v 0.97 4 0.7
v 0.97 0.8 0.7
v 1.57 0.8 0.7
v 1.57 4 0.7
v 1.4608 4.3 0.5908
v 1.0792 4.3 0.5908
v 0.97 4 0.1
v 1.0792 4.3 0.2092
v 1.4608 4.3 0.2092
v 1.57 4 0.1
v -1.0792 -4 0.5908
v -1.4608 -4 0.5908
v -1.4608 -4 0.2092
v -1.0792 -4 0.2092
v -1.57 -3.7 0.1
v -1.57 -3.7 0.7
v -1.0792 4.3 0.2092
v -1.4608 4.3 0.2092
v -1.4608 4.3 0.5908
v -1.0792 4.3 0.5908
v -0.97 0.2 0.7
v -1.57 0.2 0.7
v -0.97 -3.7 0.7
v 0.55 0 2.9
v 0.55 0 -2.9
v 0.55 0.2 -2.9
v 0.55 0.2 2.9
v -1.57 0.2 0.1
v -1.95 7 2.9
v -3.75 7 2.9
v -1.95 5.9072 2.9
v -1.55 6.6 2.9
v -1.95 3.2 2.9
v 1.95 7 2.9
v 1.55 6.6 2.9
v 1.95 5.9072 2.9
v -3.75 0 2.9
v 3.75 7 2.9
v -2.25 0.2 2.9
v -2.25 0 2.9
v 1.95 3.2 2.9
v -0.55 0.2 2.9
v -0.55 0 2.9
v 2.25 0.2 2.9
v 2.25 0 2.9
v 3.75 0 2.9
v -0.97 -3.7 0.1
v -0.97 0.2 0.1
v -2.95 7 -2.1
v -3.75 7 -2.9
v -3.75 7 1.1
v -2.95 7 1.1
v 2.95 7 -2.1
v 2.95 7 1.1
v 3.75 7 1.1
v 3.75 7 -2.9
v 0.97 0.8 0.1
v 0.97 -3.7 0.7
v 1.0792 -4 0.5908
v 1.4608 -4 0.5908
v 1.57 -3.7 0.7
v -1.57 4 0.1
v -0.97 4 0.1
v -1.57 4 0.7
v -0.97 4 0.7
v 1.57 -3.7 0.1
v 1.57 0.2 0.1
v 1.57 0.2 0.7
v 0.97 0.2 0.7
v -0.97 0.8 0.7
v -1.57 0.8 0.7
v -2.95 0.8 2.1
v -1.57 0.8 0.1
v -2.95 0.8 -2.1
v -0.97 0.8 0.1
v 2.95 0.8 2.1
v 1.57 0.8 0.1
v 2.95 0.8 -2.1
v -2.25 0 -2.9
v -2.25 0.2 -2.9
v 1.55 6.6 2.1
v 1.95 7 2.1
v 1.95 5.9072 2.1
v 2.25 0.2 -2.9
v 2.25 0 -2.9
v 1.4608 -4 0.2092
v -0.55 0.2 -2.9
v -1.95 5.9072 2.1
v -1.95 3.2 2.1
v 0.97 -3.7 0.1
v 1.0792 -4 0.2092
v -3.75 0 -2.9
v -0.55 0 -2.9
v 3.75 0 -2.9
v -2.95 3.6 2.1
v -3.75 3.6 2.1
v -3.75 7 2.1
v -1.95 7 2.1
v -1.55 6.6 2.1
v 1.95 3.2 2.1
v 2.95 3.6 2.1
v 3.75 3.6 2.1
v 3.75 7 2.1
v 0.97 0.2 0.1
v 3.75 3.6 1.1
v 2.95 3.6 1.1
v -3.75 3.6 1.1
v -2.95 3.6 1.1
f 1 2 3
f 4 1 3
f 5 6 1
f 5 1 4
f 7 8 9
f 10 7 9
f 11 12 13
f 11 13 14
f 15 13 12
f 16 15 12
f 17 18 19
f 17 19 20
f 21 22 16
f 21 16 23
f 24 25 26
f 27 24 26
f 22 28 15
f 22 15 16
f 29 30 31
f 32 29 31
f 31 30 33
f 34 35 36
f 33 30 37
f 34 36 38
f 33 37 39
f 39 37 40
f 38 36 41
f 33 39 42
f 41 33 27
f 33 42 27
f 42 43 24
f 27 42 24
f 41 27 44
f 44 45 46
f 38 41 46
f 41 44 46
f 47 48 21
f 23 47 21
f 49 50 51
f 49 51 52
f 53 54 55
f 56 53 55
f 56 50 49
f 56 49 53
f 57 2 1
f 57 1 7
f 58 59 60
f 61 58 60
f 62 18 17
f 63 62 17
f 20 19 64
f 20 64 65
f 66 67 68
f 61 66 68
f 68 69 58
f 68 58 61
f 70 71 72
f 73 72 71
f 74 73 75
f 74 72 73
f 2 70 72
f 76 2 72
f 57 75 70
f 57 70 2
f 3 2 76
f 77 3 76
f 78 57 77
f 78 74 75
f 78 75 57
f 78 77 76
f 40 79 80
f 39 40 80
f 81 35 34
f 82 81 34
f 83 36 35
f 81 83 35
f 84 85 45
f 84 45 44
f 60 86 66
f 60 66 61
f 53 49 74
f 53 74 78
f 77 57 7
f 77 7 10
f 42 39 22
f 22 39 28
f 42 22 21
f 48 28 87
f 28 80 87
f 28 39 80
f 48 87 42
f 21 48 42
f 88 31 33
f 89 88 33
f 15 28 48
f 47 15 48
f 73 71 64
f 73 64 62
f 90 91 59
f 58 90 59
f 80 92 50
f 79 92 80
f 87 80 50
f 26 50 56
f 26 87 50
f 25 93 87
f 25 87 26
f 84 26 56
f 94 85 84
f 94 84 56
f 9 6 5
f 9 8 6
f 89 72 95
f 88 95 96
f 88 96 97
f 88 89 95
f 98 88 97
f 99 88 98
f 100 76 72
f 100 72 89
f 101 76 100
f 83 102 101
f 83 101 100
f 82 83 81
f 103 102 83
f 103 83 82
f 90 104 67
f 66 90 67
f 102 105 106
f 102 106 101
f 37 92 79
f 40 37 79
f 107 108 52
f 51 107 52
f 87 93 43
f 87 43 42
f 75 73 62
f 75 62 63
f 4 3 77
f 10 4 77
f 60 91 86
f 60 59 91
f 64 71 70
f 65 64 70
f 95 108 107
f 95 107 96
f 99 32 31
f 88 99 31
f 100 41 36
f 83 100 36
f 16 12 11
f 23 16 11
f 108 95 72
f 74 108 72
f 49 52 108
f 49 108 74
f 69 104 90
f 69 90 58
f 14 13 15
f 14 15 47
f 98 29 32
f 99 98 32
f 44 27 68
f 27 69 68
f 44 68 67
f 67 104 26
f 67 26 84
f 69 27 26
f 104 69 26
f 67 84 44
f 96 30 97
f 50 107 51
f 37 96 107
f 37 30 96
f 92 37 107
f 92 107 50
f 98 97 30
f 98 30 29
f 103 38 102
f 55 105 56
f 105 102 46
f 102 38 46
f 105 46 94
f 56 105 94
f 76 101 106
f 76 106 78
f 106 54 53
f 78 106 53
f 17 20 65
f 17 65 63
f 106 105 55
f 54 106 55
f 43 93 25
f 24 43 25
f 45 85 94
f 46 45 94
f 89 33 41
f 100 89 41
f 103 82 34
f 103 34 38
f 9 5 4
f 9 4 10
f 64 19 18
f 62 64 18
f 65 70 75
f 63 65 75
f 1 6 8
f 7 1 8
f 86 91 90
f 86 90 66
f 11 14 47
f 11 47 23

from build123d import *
from OCP.BRepFilletAPI import BRepFilletAPI_MakeChamfer

# Parameters (mm, degrees)
SKETCH_1_W               = 7.5
SKETCH_1_H               = 5.8
EXTRUDE_1_DEPTH          = 7
CUT_EXTRUDE_1_DEPTH      = 9.454140997
CUT_EXTRUDE_1_DEPTH_BACK = 9.454140997
SKETCH_2_W               = 1.7
SKETCH_2_H               = 0.2
SKETCH_3_W               = 5.9
SKETCH_3_H               = 4.2
CUT_EXTRUDE_2_DEPTH      = 6.2
CUT_EXTRUDE_3_DEPTH      = 1
CUT_EXTRUDE_4_DEPTH      = 9.454140997
CUT_EXTRUDE_4_DEPTH_BACK = 9.454140997
SKETCH_5_W               = 1
SKETCH_5_H               = 3.4
SKETCH_6_W               = 0.6
SKETCH_6_H               = 0.6
EXTRUDE_3_DEPTH          = 4.2
SKETCH_7_W               = 0.6
SKETCH_7_H               = 0.6
EXTRUDE_4_DEPTH          = 3.5
CHAMFER_1_SIZE           = 0.3
CHAMFER_1_SIZE2          = 0.10919107


with BuildPart() as part:
    # 草图1 → 凸台-拉伸1 (new body)
    with BuildSketch(Plane(origin=(0, 0, 0), x_dir=(1, 0, 0), z_dir=(0, 1, 0))):
        Rectangle(SKETCH_1_W, SKETCH_1_H)
    extrude(amount=EXTRUDE_1_DEPTH)

    # 草图2 → 切除-拉伸1 (cut, two sides: drawn at the far end of the back side and taken through both)
    with BuildSketch(Plane.XY.offset(-CUT_EXTRUDE_1_DEPTH_BACK)):
        with Locations((-1.4, 0.1)):
            Rectangle(SKETCH_2_W, SKETCH_2_H)
        with Locations((1.4, 0.1)):
            Rectangle(SKETCH_2_W, SKETCH_2_H)
    extrude(amount=CUT_EXTRUDE_1_DEPTH + CUT_EXTRUDE_1_DEPTH_BACK, mode=Mode.SUBTRACT)

    # 草图3 → 切除-拉伸2 (cut)
    with BuildSketch(Plane(origin=(0, 7, 0), x_dir=(1, 0, 0), z_dir=(0, 1, 0))):
        Rectangle(SKETCH_3_W, SKETCH_3_H)
    extrude(amount=-CUT_EXTRUDE_2_DEPTH, mode=Mode.SUBTRACT)

    # 草图4 → 切除-拉伸3 (cut)
    with BuildSketch(Plane.XY.offset(2.9)):
        Polygon((-1.95, 7), (-1.55, 6.6), (-1.95, 5.907179677), (-1.95, 3.2), (1.95, 3.2), (1.95, 5.907179677), (1.55, 6.6), (1.95, 7), align=None)
    extrude(amount=-CUT_EXTRUDE_3_DEPTH, mode=Mode.SUBTRACT)

    # 草图5 → 切除-拉伸4 (cut, two sides: drawn at the far end of the back side and taken through both)
    with BuildSketch(Plane.ZY.offset(-CUT_EXTRUDE_4_DEPTH_BACK)):
        with Locations((1.6, 5.3)):
            Rectangle(SKETCH_5_W, SKETCH_5_H)
    extrude(amount=CUT_EXTRUDE_4_DEPTH + CUT_EXTRUDE_4_DEPTH_BACK, mode=Mode.SUBTRACT)

    # 草图6 → 凸台-拉伸3 (add)
    with BuildSketch(Plane.XZ.offset(-0.2)):
        with Locations((-1.27, 0.4)):
            Rectangle(SKETCH_6_W, SKETCH_6_H)
        with Locations((1.27, 0.4)):
            Rectangle(SKETCH_6_W, SKETCH_6_H)
    extrude(amount=EXTRUDE_3_DEPTH)

    # 草图7 → 凸台-拉伸4 (add)
    with BuildSketch(Plane(origin=(0, 0.8, 0), x_dir=(1, 0, 0), z_dir=(0, 1, 0))):
        with Locations((1.27, -0.4)):
            Rectangle(SKETCH_7_W, SKETCH_7_H)
        with Locations((-1.27, -0.4)):
            Rectangle(SKETCH_7_W, SKETCH_7_H)
    extrude(amount=EXTRUDE_4_DEPTH)

    # 倒角1: one chamfer whose edges measure the first distance from different faces: ONE call of the kernel's chamfer builder (chamfer() names one face for all edges)
    chamfer_1_edges_1 = [part.edges().sort_by_distance(p)[0] for p in [
        (-1.27, -4, 0.7),
    ]]
    chamfer_1_side_1 = [part.faces().sort_by_distance(p)[0] for p in [
        (-1.27, -1.9, 0.7),
    ]]
    chamfer_1_edges_2 = [part.edges().sort_by_distance(p)[0] for p in [
        (-1.57, -4, 0.4),
    ]]
    chamfer_1_side_2 = [part.faces().sort_by_distance(p)[0] for p in [
        (-1.57, -1.9, 0.4),
    ]]
    chamfer_1_edges_3 = [part.edges().sort_by_distance(p)[0] for p in [
        (-1.27, -4, 0.1),
    ]]
    chamfer_1_side_3 = [part.faces().sort_by_distance(p)[0] for p in [
        (-1.27, -1.9, 0.1),
    ]]
    chamfer_1_edges_4 = [part.edges().sort_by_distance(p)[0] for p in [
        (-0.97, -4, 0.4),
    ]]
    chamfer_1_side_4 = [part.faces().sort_by_distance(p)[0] for p in [
        (-0.97, -1.9, 0.4),
    ]]
    chamfer_1_edges_5 = [part.edges().sort_by_distance(p)[0] for p in [
        (1.27, -4, 0.1),
    ]]
    chamfer_1_side_5 = [part.faces().sort_by_distance(p)[0] for p in [
        (1.27, -1.9, 0.1),
    ]]
    chamfer_1_edges_6 = [part.edges().sort_by_distance(p)[0] for p in [
        (1.57, -4, 0.4),
    ]]
    chamfer_1_side_6 = [part.faces().sort_by_distance(p)[0] for p in [
        (1.57, -1.9, 0.4),
    ]]
    chamfer_1_edges_7 = [part.edges().sort_by_distance(p)[0] for p in [
        (1.27, -4, 0.7),
    ]]
    chamfer_1_side_7 = [part.faces().sort_by_distance(p)[0] for p in [
        (1.27, -1.9, 0.7),
    ]]
    chamfer_1_edges_8 = [part.edges().sort_by_distance(p)[0] for p in [
        (0.97, -4, 0.4),
    ]]
    chamfer_1_side_8 = [part.faces().sort_by_distance(p)[0] for p in [
        (0.97, -1.9, 0.4),
    ]]
    chamfer_1_edges_9 = [part.edges().sort_by_distance(p)[0] for p in [
        (1.27, 4.3, 0.7),
    ]]
    chamfer_1_side_9 = [part.faces().sort_by_distance(p)[0] for p in [
        (1.27, 2.55, 0.7),
    ]]
    chamfer_1_edges_10 = [part.edges().sort_by_distance(p)[0] for p in [
        (1.57, 4.3, 0.4),
    ]]
    chamfer_1_side_10 = [part.faces().sort_by_distance(p)[0] for p in [
        (1.57, 2.55, 0.4),
    ]]
    chamfer_1_edges_11 = [part.edges().sort_by_distance(p)[0] for p in [
        (1.27, 4.3, 0.1),
    ]]
    chamfer_1_side_11 = [part.faces().sort_by_distance(p)[0] for p in [
        (1.27, 2.55, 0.1),
    ]]
    chamfer_1_edges_12 = [part.edges().sort_by_distance(p)[0] for p in [
        (0.97, 4.3, 0.4),
    ]]
    chamfer_1_side_12 = [part.faces().sort_by_distance(p)[0] for p in [
        (0.97, 2.55, 0.4),
    ]]
    chamfer_1_edges_13 = [part.edges().sort_by_distance(p)[0] for p in [
        (-1.57, 4.3, 0.4),
    ]]
    chamfer_1_side_13 = [part.faces().sort_by_distance(p)[0] for p in [
        (-1.57, 2.55, 0.4),
    ]]
    chamfer_1_edges_14 = [part.edges().sort_by_distance(p)[0] for p in [
        (-1.27, 4.3, 0.7),
    ]]
    chamfer_1_side_14 = [part.faces().sort_by_distance(p)[0] for p in [
        (-1.27, 2.55, 0.7),
    ]]
    chamfer_1_edges_15 = [part.edges().sort_by_distance(p)[0] for p in [
        (-0.97, 4.3, 0.4),
    ]]
    chamfer_1_side_15 = [part.faces().sort_by_distance(p)[0] for p in [
        (-0.97, 2.55, 0.4),
    ]]
    chamfer_1_edges_16 = [part.edges().sort_by_distance(p)[0] for p in [
        (-1.27, 4.3, 0.1),
    ]]
    chamfer_1_side_16 = [part.faces().sort_by_distance(p)[0] for p in [
        (-1.27, 2.55, 0.1),
    ]]
    chamfer_1 = BRepFilletAPI_MakeChamfer(part.part.solid().wrapped)
    for e in chamfer_1_edges_1:
        chamfer_1.Add(CHAMFER_1_SIZE, CHAMFER_1_SIZE2, e.wrapped, chamfer_1_side_1[0].wrapped)  # the first distance lies on this face
    for e in chamfer_1_edges_2:
        chamfer_1.Add(CHAMFER_1_SIZE, CHAMFER_1_SIZE2, e.wrapped, chamfer_1_side_2[0].wrapped)  # the first distance lies on this face
    for e in chamfer_1_edges_3:
        chamfer_1.Add(CHAMFER_1_SIZE, CHAMFER_1_SIZE2, e.wrapped, chamfer_1_side_3[0].wrapped)  # the first distance lies on this face
    for e in chamfer_1_edges_4:
        chamfer_1.Add(CHAMFER_1_SIZE, CHAMFER_1_SIZE2, e.wrapped, chamfer_1_side_4[0].wrapped)  # the first distance lies on this face
    for e in chamfer_1_edges_5:
        chamfer_1.Add(CHAMFER_1_SIZE, CHAMFER_1_SIZE2, e.wrapped, chamfer_1_side_5[0].wrapped)  # the first distance lies on this face
    for e in chamfer_1_edges_6:
        chamfer_1.Add(CHAMFER_1_SIZE, CHAMFER_1_SIZE2, e.wrapped, chamfer_1_side_6[0].wrapped)  # the first distance lies on this face
    for e in chamfer_1_edges_7:
        chamfer_1.Add(CHAMFER_1_SIZE, CHAMFER_1_SIZE2, e.wrapped, chamfer_1_side_7[0].wrapped)  # the first distance lies on this face
    for e in chamfer_1_edges_8:
        chamfer_1.Add(CHAMFER_1_SIZE, CHAMFER_1_SIZE2, e.wrapped, chamfer_1_side_8[0].wrapped)  # the first distance lies on this face
    for e in chamfer_1_edges_9:
        chamfer_1.Add(CHAMFER_1_SIZE, CHAMFER_1_SIZE2, e.wrapped, chamfer_1_side_9[0].wrapped)  # the first distance lies on this face
    for e in chamfer_1_edges_10:
        chamfer_1.Add(CHAMFER_1_SIZE, CHAMFER_1_SIZE2, e.wrapped, chamfer_1_side_10[0].wrapped)  # the first distance lies on this face
    for e in chamfer_1_edges_11:
        chamfer_1.Add(CHAMFER_1_SIZE, CHAMFER_1_SIZE2, e.wrapped, chamfer_1_side_11[0].wrapped)  # the first distance lies on this face
    for e in chamfer_1_edges_12:
        chamfer_1.Add(CHAMFER_1_SIZE, CHAMFER_1_SIZE2, e.wrapped, chamfer_1_side_12[0].wrapped)  # the first distance lies on this face
    for e in chamfer_1_edges_13:
        chamfer_1.Add(CHAMFER_1_SIZE, CHAMFER_1_SIZE2, e.wrapped, chamfer_1_side_13[0].wrapped)  # the first distance lies on this face
    for e in chamfer_1_edges_14:
        chamfer_1.Add(CHAMFER_1_SIZE, CHAMFER_1_SIZE2, e.wrapped, chamfer_1_side_14[0].wrapped)  # the first distance lies on this face
    for e in chamfer_1_edges_15:
        chamfer_1.Add(CHAMFER_1_SIZE, CHAMFER_1_SIZE2, e.wrapped, chamfer_1_side_15[0].wrapped)  # the first distance lies on this face
    for e in chamfer_1_edges_16:
        chamfer_1.Add(CHAMFER_1_SIZE, CHAMFER_1_SIZE2, e.wrapped, chamfer_1_side_16[0].wrapped)  # the first distance lies on this face
    add(Compound.cast(chamfer_1.Shape()), mode=Mode.REPLACE)


solid = part.part
